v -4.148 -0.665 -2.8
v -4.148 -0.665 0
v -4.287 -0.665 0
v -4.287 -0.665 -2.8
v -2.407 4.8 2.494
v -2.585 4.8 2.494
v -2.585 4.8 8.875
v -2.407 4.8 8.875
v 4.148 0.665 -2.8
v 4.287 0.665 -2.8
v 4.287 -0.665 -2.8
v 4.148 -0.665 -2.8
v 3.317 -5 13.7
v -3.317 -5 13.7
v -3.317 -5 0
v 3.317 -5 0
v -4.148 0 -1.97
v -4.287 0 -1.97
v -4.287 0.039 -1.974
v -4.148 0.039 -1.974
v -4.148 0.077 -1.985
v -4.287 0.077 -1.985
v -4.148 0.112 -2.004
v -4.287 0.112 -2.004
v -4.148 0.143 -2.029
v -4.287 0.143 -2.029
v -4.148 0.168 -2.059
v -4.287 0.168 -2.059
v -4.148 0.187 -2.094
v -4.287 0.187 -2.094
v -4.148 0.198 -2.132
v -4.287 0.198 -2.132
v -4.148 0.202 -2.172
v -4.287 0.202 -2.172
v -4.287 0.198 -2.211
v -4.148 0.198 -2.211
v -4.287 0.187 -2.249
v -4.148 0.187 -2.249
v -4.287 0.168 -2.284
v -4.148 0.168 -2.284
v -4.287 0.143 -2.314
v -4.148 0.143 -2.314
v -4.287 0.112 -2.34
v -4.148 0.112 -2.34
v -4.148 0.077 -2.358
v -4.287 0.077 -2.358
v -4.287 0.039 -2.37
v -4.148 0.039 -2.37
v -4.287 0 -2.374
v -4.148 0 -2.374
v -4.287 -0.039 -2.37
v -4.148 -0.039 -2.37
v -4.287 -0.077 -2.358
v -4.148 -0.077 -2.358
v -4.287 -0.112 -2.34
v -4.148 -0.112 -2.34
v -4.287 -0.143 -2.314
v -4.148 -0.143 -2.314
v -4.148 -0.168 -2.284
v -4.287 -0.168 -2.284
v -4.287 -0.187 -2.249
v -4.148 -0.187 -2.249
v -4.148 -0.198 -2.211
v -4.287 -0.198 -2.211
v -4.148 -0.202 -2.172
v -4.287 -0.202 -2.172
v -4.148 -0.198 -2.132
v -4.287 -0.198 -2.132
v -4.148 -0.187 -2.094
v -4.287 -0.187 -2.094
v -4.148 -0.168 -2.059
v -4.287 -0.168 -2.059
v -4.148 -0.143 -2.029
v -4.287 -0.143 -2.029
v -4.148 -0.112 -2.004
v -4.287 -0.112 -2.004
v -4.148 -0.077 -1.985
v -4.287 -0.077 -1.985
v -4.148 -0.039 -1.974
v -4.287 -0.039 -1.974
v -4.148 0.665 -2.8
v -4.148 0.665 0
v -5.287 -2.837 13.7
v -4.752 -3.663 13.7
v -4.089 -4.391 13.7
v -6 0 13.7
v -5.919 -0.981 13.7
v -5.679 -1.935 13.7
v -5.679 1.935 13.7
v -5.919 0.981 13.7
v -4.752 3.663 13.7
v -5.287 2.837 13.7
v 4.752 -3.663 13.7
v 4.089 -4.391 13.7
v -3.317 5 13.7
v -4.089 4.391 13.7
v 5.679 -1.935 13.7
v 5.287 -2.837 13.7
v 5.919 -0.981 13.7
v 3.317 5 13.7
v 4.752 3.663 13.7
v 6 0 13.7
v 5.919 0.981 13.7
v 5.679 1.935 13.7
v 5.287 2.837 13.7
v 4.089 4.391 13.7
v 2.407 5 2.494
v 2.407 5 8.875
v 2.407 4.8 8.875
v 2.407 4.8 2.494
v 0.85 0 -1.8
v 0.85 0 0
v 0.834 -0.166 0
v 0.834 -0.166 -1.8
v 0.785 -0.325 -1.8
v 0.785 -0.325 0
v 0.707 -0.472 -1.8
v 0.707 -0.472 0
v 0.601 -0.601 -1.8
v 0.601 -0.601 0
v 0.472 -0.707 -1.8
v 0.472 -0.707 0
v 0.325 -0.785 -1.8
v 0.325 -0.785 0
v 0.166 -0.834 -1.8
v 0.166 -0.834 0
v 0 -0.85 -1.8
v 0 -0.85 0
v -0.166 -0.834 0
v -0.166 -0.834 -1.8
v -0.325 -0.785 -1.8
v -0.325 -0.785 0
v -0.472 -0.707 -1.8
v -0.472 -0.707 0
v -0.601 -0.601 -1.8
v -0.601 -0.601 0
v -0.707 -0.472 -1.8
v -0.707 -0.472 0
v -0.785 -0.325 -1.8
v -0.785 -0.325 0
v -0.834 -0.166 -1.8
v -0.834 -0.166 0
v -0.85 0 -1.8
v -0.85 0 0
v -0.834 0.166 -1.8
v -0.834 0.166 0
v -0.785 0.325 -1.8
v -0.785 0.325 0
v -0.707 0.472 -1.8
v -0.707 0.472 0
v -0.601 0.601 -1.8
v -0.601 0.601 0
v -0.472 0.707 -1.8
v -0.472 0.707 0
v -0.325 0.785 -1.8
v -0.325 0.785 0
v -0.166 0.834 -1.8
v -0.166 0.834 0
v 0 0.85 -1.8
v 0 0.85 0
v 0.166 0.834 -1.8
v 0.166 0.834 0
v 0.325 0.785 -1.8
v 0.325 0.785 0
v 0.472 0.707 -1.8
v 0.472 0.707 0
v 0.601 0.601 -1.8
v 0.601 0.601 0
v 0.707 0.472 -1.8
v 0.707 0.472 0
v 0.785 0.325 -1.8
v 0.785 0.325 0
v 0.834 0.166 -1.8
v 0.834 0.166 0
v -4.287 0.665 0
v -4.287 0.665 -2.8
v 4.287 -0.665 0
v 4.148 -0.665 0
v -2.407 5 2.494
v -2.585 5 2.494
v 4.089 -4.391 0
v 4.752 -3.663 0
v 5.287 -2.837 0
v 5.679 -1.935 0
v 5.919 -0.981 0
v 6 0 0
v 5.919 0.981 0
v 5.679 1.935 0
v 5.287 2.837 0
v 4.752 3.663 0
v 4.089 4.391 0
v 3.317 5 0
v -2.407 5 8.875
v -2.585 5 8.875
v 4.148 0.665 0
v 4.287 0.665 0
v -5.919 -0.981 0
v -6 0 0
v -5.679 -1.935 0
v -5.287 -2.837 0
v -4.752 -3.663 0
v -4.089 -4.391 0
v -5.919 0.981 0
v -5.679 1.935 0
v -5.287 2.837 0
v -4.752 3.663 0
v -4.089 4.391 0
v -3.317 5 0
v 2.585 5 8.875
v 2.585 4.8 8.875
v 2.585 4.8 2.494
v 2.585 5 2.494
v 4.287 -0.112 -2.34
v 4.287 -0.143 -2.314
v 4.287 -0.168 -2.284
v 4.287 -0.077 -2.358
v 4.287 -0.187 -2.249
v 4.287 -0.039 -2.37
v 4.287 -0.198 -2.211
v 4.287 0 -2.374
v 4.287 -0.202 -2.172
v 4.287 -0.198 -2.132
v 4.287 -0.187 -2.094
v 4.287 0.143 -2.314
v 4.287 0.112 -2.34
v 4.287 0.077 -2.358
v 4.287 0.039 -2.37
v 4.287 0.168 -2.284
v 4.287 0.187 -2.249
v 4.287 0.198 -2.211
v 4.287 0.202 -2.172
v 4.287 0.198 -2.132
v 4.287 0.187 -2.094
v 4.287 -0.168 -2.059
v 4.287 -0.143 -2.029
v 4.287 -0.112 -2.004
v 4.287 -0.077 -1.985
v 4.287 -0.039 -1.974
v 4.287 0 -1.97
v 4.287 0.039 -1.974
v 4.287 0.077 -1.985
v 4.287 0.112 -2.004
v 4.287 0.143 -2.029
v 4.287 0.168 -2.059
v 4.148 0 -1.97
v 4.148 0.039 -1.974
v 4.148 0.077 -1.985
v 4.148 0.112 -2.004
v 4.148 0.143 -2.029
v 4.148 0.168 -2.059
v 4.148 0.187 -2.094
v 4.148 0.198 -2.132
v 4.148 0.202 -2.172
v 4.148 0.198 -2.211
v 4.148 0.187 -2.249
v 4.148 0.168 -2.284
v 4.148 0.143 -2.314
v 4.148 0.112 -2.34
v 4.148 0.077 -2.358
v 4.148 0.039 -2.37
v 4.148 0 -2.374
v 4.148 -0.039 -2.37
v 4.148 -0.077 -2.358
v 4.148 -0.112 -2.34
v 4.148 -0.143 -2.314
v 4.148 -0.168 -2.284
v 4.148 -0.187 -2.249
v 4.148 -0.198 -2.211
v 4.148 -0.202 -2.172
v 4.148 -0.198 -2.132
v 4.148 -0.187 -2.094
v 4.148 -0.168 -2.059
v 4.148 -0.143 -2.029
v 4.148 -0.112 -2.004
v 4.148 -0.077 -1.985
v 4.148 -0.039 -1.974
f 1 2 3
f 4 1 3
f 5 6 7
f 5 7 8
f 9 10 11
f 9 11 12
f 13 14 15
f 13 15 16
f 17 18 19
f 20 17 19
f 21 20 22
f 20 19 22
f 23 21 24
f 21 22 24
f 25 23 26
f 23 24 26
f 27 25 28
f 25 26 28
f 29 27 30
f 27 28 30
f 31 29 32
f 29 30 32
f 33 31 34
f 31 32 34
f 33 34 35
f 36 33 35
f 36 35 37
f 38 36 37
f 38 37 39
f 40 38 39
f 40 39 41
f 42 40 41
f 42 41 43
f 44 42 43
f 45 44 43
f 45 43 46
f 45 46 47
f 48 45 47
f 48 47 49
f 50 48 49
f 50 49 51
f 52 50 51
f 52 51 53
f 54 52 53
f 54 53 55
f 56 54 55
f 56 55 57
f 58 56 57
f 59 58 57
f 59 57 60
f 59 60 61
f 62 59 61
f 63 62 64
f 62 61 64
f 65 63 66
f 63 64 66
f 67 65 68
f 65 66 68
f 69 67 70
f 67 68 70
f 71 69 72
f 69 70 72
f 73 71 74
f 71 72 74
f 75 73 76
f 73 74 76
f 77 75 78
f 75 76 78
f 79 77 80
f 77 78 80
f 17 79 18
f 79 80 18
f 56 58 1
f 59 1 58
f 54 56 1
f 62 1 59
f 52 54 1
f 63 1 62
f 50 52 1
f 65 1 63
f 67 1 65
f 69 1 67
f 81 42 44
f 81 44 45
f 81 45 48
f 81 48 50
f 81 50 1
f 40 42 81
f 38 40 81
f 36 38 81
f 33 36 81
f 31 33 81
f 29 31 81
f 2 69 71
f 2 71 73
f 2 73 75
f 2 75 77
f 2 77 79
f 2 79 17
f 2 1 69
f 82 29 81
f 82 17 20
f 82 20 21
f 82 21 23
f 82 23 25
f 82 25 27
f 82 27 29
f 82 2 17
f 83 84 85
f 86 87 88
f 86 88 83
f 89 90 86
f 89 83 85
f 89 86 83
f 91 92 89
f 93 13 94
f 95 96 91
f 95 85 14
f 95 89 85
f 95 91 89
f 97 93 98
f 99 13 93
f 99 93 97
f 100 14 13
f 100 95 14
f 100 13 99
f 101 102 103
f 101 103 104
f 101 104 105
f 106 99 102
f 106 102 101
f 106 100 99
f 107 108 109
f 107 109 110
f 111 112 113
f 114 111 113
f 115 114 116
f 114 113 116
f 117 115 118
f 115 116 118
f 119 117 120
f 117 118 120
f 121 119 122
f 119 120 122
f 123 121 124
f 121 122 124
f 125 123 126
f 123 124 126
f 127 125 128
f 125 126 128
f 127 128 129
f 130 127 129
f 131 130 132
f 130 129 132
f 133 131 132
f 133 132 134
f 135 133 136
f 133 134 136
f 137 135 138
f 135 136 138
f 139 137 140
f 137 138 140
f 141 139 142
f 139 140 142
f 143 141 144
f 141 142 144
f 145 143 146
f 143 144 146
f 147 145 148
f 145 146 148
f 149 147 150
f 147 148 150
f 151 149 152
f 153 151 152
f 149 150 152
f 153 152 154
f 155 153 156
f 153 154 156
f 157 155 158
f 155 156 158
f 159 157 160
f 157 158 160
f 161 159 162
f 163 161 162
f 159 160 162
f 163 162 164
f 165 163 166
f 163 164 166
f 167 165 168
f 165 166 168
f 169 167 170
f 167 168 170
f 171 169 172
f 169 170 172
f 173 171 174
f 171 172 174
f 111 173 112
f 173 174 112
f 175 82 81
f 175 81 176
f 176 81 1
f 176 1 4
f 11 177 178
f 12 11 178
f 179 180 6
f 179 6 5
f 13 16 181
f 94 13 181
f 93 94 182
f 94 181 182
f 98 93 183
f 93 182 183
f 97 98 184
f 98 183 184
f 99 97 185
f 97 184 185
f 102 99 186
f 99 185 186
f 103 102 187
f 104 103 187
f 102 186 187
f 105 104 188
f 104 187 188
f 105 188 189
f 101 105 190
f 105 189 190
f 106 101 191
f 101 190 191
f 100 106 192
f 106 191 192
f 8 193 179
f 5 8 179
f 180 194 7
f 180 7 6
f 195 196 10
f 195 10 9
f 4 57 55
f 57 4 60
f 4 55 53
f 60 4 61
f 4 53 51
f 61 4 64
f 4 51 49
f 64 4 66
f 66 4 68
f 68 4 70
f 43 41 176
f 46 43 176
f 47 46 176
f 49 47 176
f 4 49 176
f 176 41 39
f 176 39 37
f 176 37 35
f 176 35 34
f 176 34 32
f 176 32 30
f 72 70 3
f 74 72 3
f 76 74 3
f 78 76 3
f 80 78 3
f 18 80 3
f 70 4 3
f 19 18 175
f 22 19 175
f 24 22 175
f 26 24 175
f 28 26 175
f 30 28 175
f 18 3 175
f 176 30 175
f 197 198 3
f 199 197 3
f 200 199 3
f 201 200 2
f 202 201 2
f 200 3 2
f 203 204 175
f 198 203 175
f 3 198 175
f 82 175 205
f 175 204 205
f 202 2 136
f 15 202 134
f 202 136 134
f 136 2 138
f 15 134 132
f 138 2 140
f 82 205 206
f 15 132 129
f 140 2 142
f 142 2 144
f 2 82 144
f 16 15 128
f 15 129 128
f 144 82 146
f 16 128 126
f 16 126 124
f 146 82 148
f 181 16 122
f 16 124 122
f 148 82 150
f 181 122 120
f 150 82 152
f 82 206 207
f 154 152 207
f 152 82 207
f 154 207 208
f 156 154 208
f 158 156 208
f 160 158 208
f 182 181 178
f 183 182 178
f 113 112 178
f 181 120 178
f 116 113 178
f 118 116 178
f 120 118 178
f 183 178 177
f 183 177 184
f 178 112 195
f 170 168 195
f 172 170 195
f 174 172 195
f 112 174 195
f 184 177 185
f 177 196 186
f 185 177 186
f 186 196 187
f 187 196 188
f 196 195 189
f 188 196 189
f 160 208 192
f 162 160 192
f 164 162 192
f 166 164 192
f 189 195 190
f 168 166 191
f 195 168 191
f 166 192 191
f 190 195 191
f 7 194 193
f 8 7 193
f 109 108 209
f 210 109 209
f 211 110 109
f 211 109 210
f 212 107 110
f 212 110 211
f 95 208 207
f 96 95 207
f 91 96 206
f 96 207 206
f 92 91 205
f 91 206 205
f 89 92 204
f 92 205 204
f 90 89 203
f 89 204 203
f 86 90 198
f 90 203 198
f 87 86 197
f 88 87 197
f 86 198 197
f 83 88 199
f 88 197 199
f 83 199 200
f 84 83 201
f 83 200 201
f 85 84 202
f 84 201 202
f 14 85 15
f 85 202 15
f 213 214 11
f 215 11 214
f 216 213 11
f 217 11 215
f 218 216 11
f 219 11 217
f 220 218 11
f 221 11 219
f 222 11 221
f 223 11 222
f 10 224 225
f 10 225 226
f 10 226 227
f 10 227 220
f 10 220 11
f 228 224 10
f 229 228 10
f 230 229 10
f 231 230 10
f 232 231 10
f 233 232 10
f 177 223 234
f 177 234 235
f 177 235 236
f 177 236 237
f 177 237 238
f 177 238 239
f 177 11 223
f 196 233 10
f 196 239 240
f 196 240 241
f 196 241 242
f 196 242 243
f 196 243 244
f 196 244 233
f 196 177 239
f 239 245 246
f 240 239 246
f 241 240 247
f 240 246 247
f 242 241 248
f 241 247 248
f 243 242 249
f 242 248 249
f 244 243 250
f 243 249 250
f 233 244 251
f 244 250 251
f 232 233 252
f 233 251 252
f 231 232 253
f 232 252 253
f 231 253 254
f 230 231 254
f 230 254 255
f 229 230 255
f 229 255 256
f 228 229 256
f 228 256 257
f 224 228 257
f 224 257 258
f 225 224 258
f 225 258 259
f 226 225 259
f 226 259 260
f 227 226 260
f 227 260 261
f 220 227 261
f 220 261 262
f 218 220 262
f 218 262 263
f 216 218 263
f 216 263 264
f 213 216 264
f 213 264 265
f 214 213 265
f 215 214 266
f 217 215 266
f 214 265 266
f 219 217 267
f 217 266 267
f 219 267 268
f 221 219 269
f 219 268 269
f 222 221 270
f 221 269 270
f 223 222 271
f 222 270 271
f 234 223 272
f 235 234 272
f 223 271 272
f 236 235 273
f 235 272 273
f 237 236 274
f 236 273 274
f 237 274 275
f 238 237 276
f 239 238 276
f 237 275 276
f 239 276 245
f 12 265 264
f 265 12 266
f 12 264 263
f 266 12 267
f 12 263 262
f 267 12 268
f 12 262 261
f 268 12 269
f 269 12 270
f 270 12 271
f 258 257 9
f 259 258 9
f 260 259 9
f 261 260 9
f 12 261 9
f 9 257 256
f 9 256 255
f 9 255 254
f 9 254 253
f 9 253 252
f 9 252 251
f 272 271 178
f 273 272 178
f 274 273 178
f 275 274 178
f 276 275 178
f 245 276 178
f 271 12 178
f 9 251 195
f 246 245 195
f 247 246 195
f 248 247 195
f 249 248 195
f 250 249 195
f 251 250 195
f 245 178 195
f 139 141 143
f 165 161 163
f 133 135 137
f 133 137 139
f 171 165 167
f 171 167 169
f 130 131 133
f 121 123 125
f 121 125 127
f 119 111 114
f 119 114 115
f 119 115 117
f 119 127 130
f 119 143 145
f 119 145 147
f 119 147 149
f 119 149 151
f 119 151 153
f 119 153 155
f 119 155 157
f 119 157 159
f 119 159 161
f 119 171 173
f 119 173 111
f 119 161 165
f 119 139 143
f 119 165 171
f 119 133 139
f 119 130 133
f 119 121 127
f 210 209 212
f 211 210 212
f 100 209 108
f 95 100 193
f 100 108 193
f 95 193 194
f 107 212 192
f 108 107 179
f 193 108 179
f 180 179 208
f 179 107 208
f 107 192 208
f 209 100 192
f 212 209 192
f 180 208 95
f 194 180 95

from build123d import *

# Parameters (mm, degrees)
BOSS_EXTRUDE1_DEPTH = 13.7
SKETCH3_W           = 0.178571672
SKETCH3_H           = 6.380917094
CUT_EXTRUDE1_DEPTH  = 0.2
SKETCH4_R           = 0.85
BOSS_EXTRUDE3_DEPTH = 1.8
SKETCH5_W           = 0.138137893
SKETCH5_H           = 1.329179466
BOSS_EXTRUDE4_DEPTH = 2.8
SKETCH6_R           = 0.20198457
CUT_EXTRUDE2_DEPTH  = 9.6


with BuildPart() as part:
    # Sketch1 → Boss-Extrude1 (new body)
    with BuildSketch(Plane.XY):
        with BuildLine():
            Line((-3.31662479, -5), (3.31662479, -5))
            ThreePointArc((3.31662479, -5), (6, 0), (3.31662479, 5))
            Line((3.31662479, 5), (-3.31662479, 5))
            ThreePointArc((-3.31662479, 5), (-6, 0), (-3.31662479, -5))
        make_face()
    extrude(amount=BOSS_EXTRUDE1_DEPTH)

    # Sketch3 → Cut-Extrude1 (cut)
    with BuildSketch(Plane(origin=(0, 5, 0), x_dir=(1, 0, 0), z_dir=(0, 1, 0))):
        with Locations((-2.495957535, -5.684471075)):
            Rectangle(SKETCH3_W, SKETCH3_H)
        with Locations((2.495957535, -5.684471075)):
            Rectangle(SKETCH3_W, SKETCH3_H)
    extrude(amount=-CUT_EXTRUDE1_DEPTH, mode=Mode.SUBTRACT)

    # Sketch4 → Boss-Extrude3 (add)
    with BuildSketch(Plane(origin=(0, 0, 0), x_dir=(-1, 0, 0), z_dir=(0, 0, -1))):
        with Locations(Location((0, 0, 0), (0, 0, 180))):
            Circle(SKETCH4_R)
    extrude(amount=BOSS_EXTRUDE3_DEPTH)

    # Sketch5 → Boss-Extrude4 (add)
    with BuildSketch(Plane(origin=(0, 0, 0), x_dir=(-1, 0, 0), z_dir=(0, 0, -1))):
        with Locations((-4.217525365, 0)):
            Rectangle(SKETCH5_W, SKETCH5_H)
        with Locations((4.217525365, 0)):
            Rectangle(SKETCH5_W, SKETCH5_H)
    extrude(amount=BOSS_EXTRUDE4_DEPTH)

    # Sketch6 → Cut-Extrude2 (cut)
    with BuildSketch(Plane.ZY.offset(4.286594311)):
        with Locations((-2.171650698, 0)):
            Circle(SKETCH6_R)
    extrude(amount=-CUT_EXTRUDE2_DEPTH, mode=Mode.SUBTRACT)


solid = part.part
